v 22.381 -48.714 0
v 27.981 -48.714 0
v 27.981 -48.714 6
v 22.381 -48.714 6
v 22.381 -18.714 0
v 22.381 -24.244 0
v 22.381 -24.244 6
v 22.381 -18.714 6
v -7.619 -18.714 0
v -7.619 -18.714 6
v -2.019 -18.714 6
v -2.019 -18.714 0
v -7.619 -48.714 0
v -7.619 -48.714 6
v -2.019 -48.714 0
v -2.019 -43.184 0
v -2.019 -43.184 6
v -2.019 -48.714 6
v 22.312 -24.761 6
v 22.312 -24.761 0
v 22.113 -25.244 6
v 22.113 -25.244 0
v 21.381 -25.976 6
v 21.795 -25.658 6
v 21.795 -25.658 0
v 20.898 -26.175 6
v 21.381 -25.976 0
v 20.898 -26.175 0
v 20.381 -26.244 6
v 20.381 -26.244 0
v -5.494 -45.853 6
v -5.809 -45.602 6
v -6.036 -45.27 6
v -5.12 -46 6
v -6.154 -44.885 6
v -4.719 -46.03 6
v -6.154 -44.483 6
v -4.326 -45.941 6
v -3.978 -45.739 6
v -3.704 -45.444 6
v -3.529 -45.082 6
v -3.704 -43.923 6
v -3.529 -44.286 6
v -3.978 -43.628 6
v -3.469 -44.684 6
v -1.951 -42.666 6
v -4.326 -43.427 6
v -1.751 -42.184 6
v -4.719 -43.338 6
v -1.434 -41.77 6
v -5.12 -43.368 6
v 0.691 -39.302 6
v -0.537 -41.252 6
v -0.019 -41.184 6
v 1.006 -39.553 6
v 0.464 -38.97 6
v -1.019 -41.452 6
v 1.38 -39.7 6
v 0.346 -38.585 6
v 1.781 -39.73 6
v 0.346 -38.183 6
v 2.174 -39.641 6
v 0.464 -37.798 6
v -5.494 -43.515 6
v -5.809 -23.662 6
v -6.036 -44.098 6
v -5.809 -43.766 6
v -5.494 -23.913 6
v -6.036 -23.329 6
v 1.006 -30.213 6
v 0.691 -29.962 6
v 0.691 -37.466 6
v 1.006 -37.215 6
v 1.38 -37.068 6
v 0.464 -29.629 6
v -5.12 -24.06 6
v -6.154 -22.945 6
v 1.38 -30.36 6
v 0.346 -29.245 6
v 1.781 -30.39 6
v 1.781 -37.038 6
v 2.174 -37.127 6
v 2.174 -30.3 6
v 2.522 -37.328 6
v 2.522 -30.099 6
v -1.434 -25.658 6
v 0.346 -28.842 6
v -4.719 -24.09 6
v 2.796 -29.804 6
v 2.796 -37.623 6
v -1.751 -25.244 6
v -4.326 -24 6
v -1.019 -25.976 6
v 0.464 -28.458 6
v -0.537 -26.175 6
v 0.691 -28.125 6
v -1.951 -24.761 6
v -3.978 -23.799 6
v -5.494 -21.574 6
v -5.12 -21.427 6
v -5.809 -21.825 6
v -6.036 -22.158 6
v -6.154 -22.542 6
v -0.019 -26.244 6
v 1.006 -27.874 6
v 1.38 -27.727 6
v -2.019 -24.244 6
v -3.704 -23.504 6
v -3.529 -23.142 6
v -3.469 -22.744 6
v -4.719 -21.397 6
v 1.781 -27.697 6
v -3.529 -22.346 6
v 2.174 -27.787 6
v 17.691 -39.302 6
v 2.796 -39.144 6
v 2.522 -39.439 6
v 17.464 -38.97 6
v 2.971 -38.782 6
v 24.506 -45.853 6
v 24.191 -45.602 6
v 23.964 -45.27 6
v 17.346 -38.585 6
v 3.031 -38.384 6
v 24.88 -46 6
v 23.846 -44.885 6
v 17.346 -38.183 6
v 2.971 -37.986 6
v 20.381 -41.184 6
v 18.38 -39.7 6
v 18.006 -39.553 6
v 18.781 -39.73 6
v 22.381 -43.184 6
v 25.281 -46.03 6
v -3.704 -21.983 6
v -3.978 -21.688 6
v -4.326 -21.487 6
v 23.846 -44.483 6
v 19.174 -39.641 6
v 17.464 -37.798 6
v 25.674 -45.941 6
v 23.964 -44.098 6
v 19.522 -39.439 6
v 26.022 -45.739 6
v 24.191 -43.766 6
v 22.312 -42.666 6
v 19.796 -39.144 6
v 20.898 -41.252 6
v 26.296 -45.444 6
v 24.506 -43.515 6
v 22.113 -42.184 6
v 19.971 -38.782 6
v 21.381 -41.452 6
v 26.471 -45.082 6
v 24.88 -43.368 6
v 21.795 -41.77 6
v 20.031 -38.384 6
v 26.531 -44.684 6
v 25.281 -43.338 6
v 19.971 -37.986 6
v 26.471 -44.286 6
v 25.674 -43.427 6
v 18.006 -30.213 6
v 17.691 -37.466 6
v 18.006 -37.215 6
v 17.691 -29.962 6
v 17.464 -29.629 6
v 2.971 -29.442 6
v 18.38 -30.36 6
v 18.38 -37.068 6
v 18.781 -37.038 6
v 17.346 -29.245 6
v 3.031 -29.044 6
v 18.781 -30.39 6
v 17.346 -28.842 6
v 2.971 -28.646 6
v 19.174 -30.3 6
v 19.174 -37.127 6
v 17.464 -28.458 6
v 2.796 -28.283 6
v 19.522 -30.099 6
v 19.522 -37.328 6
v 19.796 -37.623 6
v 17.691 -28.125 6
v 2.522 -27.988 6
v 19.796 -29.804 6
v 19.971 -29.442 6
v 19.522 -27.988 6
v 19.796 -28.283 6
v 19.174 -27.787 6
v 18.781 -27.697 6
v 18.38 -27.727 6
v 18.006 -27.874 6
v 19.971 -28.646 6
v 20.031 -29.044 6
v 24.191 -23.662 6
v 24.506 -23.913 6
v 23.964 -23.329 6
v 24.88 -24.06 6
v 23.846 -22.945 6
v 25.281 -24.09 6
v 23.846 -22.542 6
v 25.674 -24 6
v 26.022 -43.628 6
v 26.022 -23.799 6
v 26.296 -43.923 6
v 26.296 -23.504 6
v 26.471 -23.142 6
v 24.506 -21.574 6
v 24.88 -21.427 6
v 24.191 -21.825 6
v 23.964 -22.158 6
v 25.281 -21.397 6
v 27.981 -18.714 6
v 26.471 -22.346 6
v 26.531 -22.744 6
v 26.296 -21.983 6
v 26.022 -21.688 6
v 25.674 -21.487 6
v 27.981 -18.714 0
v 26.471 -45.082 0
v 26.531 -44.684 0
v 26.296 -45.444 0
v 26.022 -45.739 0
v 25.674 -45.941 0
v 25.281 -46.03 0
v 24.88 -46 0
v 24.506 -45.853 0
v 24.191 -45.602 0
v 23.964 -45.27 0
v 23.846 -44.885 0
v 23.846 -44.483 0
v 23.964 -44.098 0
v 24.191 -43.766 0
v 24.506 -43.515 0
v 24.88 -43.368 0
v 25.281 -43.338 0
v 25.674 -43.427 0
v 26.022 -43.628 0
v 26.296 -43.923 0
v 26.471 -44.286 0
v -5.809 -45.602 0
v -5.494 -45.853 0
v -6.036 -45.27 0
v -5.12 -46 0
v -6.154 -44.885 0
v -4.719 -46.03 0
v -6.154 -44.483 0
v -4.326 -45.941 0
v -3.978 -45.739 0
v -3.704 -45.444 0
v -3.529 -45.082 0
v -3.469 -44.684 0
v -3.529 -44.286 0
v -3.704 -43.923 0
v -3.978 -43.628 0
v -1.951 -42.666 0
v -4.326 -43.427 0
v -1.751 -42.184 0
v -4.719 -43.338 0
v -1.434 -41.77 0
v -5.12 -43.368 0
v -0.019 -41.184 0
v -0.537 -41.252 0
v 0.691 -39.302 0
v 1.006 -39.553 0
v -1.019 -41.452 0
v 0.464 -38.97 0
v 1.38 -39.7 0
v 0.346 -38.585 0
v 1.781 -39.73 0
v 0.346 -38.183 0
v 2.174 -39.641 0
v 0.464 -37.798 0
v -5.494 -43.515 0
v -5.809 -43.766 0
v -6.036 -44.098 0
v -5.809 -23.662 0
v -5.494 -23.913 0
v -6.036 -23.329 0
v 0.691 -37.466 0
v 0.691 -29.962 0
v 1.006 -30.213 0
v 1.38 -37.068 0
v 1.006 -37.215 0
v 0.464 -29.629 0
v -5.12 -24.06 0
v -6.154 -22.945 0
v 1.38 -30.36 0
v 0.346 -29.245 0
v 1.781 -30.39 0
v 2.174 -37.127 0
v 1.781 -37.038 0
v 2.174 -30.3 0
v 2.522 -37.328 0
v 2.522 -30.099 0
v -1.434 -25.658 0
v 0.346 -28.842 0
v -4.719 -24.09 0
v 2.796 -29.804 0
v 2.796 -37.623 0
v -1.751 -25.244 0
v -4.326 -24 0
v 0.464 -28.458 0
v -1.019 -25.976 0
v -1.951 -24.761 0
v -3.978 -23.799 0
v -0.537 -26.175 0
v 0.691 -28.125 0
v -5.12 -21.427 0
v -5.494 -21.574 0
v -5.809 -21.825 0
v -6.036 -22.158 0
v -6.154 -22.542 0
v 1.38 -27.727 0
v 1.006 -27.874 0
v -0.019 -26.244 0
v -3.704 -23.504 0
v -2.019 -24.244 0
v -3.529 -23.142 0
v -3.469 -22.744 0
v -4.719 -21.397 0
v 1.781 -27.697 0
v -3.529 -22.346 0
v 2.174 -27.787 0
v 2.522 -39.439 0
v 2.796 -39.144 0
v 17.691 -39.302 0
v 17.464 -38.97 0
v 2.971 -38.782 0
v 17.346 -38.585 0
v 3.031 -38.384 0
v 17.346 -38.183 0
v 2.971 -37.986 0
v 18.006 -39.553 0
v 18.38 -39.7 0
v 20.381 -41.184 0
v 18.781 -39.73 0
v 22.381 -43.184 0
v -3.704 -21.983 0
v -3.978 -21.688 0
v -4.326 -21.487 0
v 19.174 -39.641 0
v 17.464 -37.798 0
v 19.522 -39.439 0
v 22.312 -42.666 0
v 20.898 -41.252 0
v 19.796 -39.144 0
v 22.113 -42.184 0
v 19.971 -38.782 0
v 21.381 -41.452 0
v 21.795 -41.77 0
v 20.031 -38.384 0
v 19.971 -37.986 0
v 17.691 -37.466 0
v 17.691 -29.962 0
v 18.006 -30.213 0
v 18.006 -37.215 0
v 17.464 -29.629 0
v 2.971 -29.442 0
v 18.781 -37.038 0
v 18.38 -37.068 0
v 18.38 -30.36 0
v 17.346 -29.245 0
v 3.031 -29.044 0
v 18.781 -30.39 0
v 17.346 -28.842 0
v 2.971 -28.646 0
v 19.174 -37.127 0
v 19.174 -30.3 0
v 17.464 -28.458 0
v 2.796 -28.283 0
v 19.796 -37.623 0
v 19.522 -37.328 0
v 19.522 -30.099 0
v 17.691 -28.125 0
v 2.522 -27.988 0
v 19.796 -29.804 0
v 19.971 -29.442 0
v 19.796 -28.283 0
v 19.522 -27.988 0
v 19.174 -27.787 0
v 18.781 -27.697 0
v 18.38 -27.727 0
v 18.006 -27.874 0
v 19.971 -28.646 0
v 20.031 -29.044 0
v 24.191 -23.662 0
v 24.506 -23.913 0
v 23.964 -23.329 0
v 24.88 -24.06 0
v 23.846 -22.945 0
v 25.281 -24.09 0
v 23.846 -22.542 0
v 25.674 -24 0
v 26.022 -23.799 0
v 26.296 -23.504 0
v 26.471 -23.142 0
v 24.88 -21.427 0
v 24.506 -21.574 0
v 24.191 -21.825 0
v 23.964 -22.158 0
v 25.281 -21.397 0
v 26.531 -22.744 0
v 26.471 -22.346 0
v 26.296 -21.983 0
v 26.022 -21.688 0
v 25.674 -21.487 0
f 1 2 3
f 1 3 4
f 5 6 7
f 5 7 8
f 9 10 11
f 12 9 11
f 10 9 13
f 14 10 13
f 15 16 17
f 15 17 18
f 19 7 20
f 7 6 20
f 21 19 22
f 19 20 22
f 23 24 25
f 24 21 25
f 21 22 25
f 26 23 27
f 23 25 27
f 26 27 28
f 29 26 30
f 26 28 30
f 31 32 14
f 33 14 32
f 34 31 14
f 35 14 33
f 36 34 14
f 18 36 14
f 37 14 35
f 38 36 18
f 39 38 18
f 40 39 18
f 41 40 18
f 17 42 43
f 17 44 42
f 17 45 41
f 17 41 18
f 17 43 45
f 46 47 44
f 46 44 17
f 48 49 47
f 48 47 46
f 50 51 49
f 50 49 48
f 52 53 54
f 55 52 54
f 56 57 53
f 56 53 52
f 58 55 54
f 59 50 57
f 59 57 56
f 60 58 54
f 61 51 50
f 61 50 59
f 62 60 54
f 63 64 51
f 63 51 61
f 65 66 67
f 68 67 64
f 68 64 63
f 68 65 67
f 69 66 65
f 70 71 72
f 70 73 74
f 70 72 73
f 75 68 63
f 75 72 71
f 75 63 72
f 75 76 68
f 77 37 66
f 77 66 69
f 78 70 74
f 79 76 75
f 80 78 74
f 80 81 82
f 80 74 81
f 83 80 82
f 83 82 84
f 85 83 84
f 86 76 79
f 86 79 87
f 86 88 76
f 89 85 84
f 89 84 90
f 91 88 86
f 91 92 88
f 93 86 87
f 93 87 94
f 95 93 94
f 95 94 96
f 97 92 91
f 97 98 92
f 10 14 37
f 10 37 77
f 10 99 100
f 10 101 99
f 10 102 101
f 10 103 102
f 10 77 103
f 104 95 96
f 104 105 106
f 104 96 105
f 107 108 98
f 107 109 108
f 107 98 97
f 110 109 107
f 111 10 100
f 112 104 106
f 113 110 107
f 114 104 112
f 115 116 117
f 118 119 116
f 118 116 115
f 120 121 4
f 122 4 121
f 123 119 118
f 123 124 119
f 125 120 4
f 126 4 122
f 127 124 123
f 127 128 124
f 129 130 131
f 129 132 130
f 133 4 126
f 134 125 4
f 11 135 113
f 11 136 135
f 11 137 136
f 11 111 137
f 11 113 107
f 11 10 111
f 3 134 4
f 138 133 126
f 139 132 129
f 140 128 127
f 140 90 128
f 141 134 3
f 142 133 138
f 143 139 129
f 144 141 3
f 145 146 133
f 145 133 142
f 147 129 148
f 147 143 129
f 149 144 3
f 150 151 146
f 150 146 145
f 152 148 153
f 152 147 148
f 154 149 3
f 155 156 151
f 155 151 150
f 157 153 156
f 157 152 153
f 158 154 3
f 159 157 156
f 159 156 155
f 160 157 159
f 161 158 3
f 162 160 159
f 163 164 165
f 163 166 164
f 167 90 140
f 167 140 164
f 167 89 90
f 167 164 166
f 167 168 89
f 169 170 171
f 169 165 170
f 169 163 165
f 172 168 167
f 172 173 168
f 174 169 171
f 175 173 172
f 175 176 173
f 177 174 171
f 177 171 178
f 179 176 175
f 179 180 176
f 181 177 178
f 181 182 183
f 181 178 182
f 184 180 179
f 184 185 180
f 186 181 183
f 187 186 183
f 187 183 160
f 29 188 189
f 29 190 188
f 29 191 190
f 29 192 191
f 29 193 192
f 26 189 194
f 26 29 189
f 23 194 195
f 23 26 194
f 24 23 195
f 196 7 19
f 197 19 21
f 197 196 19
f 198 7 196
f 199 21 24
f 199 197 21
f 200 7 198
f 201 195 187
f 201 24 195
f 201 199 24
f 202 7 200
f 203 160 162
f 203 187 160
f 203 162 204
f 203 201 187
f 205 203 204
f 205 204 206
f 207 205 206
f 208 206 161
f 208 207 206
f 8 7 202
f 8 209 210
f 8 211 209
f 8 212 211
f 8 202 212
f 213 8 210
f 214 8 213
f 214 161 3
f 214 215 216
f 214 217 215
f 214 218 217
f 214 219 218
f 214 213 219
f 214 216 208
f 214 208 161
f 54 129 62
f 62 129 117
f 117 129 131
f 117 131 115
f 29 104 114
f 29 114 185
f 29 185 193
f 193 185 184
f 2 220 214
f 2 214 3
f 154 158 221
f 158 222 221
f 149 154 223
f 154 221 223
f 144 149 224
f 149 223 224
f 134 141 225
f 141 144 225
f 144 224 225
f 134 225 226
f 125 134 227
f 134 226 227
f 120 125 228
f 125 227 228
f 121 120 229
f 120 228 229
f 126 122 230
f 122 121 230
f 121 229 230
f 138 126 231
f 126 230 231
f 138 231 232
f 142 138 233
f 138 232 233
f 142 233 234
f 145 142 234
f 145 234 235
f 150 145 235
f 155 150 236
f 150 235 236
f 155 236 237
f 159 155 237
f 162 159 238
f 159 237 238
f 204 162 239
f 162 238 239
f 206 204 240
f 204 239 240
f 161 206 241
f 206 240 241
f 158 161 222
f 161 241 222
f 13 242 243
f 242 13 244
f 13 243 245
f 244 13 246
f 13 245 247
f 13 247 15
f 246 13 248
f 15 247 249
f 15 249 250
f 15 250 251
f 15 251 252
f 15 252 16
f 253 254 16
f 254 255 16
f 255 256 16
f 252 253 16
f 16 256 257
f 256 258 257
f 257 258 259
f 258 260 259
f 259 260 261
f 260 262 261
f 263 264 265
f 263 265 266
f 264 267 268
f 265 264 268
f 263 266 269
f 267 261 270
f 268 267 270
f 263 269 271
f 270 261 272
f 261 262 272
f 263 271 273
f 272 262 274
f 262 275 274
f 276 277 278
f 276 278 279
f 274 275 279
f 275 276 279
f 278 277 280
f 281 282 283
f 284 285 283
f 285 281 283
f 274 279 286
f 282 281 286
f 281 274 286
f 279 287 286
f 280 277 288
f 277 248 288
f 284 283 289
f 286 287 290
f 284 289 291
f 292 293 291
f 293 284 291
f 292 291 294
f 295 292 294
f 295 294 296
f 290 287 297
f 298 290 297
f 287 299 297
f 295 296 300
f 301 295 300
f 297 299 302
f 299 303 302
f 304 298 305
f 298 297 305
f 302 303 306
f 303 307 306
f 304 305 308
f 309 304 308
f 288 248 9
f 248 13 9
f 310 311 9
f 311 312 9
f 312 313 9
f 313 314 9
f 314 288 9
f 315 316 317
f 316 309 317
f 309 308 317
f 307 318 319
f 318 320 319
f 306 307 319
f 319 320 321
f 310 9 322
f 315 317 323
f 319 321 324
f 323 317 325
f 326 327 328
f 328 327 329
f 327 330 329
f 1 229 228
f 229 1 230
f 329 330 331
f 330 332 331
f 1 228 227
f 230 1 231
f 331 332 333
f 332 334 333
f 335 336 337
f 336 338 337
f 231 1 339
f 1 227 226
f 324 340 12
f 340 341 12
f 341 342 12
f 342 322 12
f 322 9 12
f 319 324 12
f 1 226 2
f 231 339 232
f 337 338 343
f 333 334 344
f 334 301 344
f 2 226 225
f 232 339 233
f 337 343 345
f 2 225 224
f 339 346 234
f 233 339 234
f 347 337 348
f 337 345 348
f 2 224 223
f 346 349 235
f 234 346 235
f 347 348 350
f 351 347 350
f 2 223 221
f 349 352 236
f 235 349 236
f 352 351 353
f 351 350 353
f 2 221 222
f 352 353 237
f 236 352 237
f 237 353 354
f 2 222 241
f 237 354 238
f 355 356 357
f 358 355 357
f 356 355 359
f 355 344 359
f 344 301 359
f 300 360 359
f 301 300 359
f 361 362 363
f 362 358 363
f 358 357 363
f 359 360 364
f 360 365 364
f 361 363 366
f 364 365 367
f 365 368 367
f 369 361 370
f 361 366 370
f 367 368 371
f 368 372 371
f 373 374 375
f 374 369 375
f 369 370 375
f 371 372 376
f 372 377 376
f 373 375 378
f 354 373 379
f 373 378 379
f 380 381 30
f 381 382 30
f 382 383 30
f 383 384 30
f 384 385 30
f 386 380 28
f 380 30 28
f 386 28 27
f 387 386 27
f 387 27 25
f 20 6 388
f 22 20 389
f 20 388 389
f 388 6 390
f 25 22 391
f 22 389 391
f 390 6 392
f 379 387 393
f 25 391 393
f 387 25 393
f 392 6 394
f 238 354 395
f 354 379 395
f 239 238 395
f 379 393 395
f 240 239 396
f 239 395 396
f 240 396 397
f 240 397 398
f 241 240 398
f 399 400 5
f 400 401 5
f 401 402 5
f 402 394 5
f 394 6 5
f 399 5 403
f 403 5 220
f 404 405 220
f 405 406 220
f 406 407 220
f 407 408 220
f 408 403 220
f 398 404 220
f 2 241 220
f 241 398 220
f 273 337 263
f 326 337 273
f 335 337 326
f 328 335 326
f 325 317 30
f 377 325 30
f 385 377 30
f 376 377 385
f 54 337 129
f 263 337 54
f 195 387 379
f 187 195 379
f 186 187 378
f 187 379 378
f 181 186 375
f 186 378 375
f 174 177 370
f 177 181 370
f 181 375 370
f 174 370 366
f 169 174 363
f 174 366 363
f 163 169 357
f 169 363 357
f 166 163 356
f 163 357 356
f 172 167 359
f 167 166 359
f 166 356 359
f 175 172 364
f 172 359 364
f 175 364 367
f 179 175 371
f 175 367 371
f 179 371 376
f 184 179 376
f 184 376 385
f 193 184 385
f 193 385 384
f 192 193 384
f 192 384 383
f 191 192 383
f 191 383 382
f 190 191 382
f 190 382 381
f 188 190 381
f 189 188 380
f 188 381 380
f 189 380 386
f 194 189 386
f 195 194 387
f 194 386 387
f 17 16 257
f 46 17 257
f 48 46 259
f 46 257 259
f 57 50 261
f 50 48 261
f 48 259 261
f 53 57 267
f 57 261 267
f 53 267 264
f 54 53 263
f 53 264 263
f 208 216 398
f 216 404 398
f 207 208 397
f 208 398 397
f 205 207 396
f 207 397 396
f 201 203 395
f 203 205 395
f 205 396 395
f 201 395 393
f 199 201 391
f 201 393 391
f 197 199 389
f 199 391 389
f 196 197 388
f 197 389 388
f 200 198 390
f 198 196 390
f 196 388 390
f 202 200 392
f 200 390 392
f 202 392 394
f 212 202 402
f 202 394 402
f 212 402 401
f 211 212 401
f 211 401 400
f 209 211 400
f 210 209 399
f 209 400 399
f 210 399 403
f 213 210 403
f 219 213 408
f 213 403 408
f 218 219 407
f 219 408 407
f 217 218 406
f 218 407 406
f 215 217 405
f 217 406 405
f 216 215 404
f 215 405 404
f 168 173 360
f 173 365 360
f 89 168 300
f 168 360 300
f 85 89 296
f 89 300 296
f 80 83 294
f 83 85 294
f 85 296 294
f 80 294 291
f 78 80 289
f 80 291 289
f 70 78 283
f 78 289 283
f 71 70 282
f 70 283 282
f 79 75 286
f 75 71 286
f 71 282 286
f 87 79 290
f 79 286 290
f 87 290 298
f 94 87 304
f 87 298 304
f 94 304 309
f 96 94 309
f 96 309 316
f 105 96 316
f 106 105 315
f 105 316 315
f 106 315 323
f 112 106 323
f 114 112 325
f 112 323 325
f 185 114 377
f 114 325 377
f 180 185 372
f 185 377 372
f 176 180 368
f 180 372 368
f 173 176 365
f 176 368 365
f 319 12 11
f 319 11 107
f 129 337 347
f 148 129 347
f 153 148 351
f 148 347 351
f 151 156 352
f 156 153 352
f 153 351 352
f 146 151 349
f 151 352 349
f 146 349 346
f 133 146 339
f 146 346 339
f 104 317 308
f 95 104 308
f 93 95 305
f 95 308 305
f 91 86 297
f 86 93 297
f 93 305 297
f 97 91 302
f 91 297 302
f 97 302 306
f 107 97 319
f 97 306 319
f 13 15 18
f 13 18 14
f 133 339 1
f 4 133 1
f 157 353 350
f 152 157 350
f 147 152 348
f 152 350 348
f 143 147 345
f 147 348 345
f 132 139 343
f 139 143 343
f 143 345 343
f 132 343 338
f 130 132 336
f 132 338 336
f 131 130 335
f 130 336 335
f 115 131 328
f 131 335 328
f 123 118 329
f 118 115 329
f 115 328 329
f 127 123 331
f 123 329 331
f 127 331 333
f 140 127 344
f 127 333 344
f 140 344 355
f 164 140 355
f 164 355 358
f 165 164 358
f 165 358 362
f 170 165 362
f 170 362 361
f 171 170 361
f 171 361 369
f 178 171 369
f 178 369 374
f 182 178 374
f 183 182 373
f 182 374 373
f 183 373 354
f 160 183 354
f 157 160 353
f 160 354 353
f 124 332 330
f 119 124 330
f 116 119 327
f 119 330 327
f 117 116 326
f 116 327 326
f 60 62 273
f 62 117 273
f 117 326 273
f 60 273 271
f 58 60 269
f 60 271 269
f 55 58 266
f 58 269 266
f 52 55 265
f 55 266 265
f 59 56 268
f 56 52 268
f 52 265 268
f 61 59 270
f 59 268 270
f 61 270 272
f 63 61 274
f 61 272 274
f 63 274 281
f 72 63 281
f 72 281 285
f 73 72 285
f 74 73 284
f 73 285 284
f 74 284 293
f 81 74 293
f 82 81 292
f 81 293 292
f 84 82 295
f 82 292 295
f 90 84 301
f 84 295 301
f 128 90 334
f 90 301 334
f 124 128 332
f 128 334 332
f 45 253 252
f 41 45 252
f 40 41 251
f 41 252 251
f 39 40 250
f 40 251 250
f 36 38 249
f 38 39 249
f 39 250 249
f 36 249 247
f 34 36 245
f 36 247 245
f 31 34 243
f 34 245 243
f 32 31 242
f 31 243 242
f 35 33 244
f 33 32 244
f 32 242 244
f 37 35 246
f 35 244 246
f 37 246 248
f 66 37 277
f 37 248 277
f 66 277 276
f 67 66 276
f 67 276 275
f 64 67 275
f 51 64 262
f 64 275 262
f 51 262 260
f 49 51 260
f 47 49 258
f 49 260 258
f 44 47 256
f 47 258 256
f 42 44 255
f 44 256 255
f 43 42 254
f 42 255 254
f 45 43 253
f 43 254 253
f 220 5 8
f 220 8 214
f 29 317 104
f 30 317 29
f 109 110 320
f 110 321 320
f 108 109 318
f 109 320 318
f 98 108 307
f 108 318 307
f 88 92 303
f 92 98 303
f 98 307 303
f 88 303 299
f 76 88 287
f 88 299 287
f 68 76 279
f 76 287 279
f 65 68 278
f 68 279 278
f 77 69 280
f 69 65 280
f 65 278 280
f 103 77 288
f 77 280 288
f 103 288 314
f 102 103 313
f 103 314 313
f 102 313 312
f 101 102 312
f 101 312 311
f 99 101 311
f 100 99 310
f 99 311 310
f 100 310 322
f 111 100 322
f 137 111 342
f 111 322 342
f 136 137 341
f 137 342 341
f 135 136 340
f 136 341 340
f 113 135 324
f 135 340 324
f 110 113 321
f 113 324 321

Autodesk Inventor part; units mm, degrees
ref_plane "YZ Plane" through (0, 0, 0) normal (1, 0, 0) x (0, 1, 0)
ref_plane "XZ Plane" through (0, 0, 0) normal (0, 1, 0) x (-1, 0, 0)
ref_plane "XY Plane" through (0, 0, 0) normal (0, 0, 1) x (1, 0, 0)
sketch "스케치1" plane through (0, 0, 0) normal (0, 0, 1) x (1, 0, 0)
  line L0 (22.3806, -23.2436) -> (22.3806, 15.7564)
  arc A0 (20.3806, -26.2436) -> (22.3806, -24.2436) centre (20.3806, -24.2436) ccw
  line L1 (22.3806, -24.2436) -> (22.3806, -22.8439)
  line L2 (18.7808, -26.2436) -> (20.3806, -26.2436)
  line L3 (0.9806, -26.2436) -> (19.3806, -26.2436)
  arc A1 (-2.0194, -24.2436) -> (-0.0194, -26.2436) centre (-0.0194, -24.2436) ccw
  line L4 (-0.0194, -26.2436) -> (1.5803, -26.2436)
  line L5 (-2.0194, -24.2436) -> (-2.0194, -22.8439)
  line L6 (-2.0194, 15.7564) -> (-2.0194, -23.2436)
  circle A2 centre (25.1806, -22.7436) radius 1.45
  circle A3 centre (18.6806, -29.0436) radius 1.45
  circle A4 centre (1.6806, -29.0436) radius 1.45
  circle A5 centre (-4.8194, -22.7436) radius 1.45
  line L7 (-7.6194, -18.7138) -> (27.9806, -18.7138)
  line L8 (-7.6194, -18.7138) -> (27.9806, -18.7138)
  arc A6 (-0.0194, -41.1839) -> (-2.0194, -43.1839) centre (-0.0194, -43.1839) ccw
  line L9 (-2.0194, -43.1839) -> (-2.0194, -44.5837)
  line L10 (1.5803, -41.1839) -> (-0.0194, -41.1839)
  line L11 (19.3806, -41.1839) -> (0.9806, -41.1839)
  arc A7 (22.3806, -43.1839) -> (20.3806, -41.1839) centre (20.3806, -43.1839) ccw
  line L12 (20.3806, -41.1839) -> (18.7808, -41.1839)
  line L13 (22.3806, -43.1839) -> (22.3806, -44.5837)
  circle A8 centre (-4.8194, -44.6839) radius 1.45
  circle A9 centre (1.6806, -38.3839) radius 1.45
  circle A10 centre (18.6806, -38.3839) radius 1.45
  circle A11 centre (25.1806, -44.6839) radius 1.45
  line L14 (27.9806, -48.7138) -> (-7.6194, -48.7138)
  line L15 (27.9806, -48.7138) -> (-7.6194, -48.7138)
  line L16 (-2.0194, -44.5837) -> (-2.0194, -48.7138)
  line L17 (22.3806, -44.5837) -> (22.3806, -48.7138)
  line L18 (10.1806, -18.7138) -> (10.1806, -33.7138)
  line L19 (-7.6194, -48.7138) -> (27.9806, -48.7138)
  line L20 (27.9806, -48.7138) -> (27.9806, -33.7138)
  line L21 (27.9806, -33.7138) -> (-7.6194, -33.7138)
  line L22 (-7.6194, -33.7138) -> (-7.6194, -48.7138)
  circle A12 centre (10.1806, -33.7138) radius 2.4281
  line L23 (-7.6194, -18.7138) -> (-7.6194, -34.6206)
  line L24 (27.9806, -18.7138) -> (27.9806, -33.7138)
  circle A13 centre (-4.8194, -22.7436) radius 1.35
  circle A14 centre (1.6806, -29.0436) radius 1.35
  circle A15 centre (18.6806, -29.0436) radius 1.35
  circle A16 centre (25.1806, -22.7436) radius 1.35
  circle A17 centre (18.6806, -38.3839) radius 1.35
  circle A18 centre (25.1806, -44.6839) radius 1.35
  circle A19 centre (1.6806, -38.3839) radius 1.35
  circle A20 centre (-4.8194, -44.6839) radius 1.35
  point P0 (0, 0)
  point P1 (-7.1939, 58.7329)
  point P2 (22.3806, -18.7138)
  point P3 (-2.0194, -18.7138)
  point P4 (27.9806, -25.8436)
  point P5 (-7.6194, -25.8436)
  point P6 (-2.0194, -44.1839)
  point P7 (-7.6194, -41.5839)
  point P8 (22.3806, -44.1839)
  point P9 (27.9806, -41.5839)
  point P10 (-2.0194, -18.7138)
  point P11 (22.3806, -18.7138)
  point P12 (10.1806, -48.7138)
  dimension "d11" = 30
  dimension "d12" = 15
  dimension "d13" = 15
  dimension "d14" = 2.7
  dimension "d15" = 2.7
  dimension "d16" = 2.7
  dimension "d17" = 2.7
  dimension "d18" = 2.7
  dimension "d19" = 2.7
  dimension "d20" = 2.7
  dimension "d21" = 2.7
extrude "돌출1" add sketch "스케치1" along normal blind 6 contours L0 L7 L24 L21 A12 L18 L3 L2 A0 L1 | L6 L5 A1 L4 L3 L18 A12 L21 L23 L7 | L20 L14 L17 L13 A7 L12 L11 L10 A6 L9 L16 L22 L21 A12 | A12 L21 L18 | L18 L21 A12 | A12 L21 | A2 | A3 | A4 | A5 | A8 | A9 | A10 | A11
properties part number "frame_arm_to_hand1" material "PMMA 플라스틱"
